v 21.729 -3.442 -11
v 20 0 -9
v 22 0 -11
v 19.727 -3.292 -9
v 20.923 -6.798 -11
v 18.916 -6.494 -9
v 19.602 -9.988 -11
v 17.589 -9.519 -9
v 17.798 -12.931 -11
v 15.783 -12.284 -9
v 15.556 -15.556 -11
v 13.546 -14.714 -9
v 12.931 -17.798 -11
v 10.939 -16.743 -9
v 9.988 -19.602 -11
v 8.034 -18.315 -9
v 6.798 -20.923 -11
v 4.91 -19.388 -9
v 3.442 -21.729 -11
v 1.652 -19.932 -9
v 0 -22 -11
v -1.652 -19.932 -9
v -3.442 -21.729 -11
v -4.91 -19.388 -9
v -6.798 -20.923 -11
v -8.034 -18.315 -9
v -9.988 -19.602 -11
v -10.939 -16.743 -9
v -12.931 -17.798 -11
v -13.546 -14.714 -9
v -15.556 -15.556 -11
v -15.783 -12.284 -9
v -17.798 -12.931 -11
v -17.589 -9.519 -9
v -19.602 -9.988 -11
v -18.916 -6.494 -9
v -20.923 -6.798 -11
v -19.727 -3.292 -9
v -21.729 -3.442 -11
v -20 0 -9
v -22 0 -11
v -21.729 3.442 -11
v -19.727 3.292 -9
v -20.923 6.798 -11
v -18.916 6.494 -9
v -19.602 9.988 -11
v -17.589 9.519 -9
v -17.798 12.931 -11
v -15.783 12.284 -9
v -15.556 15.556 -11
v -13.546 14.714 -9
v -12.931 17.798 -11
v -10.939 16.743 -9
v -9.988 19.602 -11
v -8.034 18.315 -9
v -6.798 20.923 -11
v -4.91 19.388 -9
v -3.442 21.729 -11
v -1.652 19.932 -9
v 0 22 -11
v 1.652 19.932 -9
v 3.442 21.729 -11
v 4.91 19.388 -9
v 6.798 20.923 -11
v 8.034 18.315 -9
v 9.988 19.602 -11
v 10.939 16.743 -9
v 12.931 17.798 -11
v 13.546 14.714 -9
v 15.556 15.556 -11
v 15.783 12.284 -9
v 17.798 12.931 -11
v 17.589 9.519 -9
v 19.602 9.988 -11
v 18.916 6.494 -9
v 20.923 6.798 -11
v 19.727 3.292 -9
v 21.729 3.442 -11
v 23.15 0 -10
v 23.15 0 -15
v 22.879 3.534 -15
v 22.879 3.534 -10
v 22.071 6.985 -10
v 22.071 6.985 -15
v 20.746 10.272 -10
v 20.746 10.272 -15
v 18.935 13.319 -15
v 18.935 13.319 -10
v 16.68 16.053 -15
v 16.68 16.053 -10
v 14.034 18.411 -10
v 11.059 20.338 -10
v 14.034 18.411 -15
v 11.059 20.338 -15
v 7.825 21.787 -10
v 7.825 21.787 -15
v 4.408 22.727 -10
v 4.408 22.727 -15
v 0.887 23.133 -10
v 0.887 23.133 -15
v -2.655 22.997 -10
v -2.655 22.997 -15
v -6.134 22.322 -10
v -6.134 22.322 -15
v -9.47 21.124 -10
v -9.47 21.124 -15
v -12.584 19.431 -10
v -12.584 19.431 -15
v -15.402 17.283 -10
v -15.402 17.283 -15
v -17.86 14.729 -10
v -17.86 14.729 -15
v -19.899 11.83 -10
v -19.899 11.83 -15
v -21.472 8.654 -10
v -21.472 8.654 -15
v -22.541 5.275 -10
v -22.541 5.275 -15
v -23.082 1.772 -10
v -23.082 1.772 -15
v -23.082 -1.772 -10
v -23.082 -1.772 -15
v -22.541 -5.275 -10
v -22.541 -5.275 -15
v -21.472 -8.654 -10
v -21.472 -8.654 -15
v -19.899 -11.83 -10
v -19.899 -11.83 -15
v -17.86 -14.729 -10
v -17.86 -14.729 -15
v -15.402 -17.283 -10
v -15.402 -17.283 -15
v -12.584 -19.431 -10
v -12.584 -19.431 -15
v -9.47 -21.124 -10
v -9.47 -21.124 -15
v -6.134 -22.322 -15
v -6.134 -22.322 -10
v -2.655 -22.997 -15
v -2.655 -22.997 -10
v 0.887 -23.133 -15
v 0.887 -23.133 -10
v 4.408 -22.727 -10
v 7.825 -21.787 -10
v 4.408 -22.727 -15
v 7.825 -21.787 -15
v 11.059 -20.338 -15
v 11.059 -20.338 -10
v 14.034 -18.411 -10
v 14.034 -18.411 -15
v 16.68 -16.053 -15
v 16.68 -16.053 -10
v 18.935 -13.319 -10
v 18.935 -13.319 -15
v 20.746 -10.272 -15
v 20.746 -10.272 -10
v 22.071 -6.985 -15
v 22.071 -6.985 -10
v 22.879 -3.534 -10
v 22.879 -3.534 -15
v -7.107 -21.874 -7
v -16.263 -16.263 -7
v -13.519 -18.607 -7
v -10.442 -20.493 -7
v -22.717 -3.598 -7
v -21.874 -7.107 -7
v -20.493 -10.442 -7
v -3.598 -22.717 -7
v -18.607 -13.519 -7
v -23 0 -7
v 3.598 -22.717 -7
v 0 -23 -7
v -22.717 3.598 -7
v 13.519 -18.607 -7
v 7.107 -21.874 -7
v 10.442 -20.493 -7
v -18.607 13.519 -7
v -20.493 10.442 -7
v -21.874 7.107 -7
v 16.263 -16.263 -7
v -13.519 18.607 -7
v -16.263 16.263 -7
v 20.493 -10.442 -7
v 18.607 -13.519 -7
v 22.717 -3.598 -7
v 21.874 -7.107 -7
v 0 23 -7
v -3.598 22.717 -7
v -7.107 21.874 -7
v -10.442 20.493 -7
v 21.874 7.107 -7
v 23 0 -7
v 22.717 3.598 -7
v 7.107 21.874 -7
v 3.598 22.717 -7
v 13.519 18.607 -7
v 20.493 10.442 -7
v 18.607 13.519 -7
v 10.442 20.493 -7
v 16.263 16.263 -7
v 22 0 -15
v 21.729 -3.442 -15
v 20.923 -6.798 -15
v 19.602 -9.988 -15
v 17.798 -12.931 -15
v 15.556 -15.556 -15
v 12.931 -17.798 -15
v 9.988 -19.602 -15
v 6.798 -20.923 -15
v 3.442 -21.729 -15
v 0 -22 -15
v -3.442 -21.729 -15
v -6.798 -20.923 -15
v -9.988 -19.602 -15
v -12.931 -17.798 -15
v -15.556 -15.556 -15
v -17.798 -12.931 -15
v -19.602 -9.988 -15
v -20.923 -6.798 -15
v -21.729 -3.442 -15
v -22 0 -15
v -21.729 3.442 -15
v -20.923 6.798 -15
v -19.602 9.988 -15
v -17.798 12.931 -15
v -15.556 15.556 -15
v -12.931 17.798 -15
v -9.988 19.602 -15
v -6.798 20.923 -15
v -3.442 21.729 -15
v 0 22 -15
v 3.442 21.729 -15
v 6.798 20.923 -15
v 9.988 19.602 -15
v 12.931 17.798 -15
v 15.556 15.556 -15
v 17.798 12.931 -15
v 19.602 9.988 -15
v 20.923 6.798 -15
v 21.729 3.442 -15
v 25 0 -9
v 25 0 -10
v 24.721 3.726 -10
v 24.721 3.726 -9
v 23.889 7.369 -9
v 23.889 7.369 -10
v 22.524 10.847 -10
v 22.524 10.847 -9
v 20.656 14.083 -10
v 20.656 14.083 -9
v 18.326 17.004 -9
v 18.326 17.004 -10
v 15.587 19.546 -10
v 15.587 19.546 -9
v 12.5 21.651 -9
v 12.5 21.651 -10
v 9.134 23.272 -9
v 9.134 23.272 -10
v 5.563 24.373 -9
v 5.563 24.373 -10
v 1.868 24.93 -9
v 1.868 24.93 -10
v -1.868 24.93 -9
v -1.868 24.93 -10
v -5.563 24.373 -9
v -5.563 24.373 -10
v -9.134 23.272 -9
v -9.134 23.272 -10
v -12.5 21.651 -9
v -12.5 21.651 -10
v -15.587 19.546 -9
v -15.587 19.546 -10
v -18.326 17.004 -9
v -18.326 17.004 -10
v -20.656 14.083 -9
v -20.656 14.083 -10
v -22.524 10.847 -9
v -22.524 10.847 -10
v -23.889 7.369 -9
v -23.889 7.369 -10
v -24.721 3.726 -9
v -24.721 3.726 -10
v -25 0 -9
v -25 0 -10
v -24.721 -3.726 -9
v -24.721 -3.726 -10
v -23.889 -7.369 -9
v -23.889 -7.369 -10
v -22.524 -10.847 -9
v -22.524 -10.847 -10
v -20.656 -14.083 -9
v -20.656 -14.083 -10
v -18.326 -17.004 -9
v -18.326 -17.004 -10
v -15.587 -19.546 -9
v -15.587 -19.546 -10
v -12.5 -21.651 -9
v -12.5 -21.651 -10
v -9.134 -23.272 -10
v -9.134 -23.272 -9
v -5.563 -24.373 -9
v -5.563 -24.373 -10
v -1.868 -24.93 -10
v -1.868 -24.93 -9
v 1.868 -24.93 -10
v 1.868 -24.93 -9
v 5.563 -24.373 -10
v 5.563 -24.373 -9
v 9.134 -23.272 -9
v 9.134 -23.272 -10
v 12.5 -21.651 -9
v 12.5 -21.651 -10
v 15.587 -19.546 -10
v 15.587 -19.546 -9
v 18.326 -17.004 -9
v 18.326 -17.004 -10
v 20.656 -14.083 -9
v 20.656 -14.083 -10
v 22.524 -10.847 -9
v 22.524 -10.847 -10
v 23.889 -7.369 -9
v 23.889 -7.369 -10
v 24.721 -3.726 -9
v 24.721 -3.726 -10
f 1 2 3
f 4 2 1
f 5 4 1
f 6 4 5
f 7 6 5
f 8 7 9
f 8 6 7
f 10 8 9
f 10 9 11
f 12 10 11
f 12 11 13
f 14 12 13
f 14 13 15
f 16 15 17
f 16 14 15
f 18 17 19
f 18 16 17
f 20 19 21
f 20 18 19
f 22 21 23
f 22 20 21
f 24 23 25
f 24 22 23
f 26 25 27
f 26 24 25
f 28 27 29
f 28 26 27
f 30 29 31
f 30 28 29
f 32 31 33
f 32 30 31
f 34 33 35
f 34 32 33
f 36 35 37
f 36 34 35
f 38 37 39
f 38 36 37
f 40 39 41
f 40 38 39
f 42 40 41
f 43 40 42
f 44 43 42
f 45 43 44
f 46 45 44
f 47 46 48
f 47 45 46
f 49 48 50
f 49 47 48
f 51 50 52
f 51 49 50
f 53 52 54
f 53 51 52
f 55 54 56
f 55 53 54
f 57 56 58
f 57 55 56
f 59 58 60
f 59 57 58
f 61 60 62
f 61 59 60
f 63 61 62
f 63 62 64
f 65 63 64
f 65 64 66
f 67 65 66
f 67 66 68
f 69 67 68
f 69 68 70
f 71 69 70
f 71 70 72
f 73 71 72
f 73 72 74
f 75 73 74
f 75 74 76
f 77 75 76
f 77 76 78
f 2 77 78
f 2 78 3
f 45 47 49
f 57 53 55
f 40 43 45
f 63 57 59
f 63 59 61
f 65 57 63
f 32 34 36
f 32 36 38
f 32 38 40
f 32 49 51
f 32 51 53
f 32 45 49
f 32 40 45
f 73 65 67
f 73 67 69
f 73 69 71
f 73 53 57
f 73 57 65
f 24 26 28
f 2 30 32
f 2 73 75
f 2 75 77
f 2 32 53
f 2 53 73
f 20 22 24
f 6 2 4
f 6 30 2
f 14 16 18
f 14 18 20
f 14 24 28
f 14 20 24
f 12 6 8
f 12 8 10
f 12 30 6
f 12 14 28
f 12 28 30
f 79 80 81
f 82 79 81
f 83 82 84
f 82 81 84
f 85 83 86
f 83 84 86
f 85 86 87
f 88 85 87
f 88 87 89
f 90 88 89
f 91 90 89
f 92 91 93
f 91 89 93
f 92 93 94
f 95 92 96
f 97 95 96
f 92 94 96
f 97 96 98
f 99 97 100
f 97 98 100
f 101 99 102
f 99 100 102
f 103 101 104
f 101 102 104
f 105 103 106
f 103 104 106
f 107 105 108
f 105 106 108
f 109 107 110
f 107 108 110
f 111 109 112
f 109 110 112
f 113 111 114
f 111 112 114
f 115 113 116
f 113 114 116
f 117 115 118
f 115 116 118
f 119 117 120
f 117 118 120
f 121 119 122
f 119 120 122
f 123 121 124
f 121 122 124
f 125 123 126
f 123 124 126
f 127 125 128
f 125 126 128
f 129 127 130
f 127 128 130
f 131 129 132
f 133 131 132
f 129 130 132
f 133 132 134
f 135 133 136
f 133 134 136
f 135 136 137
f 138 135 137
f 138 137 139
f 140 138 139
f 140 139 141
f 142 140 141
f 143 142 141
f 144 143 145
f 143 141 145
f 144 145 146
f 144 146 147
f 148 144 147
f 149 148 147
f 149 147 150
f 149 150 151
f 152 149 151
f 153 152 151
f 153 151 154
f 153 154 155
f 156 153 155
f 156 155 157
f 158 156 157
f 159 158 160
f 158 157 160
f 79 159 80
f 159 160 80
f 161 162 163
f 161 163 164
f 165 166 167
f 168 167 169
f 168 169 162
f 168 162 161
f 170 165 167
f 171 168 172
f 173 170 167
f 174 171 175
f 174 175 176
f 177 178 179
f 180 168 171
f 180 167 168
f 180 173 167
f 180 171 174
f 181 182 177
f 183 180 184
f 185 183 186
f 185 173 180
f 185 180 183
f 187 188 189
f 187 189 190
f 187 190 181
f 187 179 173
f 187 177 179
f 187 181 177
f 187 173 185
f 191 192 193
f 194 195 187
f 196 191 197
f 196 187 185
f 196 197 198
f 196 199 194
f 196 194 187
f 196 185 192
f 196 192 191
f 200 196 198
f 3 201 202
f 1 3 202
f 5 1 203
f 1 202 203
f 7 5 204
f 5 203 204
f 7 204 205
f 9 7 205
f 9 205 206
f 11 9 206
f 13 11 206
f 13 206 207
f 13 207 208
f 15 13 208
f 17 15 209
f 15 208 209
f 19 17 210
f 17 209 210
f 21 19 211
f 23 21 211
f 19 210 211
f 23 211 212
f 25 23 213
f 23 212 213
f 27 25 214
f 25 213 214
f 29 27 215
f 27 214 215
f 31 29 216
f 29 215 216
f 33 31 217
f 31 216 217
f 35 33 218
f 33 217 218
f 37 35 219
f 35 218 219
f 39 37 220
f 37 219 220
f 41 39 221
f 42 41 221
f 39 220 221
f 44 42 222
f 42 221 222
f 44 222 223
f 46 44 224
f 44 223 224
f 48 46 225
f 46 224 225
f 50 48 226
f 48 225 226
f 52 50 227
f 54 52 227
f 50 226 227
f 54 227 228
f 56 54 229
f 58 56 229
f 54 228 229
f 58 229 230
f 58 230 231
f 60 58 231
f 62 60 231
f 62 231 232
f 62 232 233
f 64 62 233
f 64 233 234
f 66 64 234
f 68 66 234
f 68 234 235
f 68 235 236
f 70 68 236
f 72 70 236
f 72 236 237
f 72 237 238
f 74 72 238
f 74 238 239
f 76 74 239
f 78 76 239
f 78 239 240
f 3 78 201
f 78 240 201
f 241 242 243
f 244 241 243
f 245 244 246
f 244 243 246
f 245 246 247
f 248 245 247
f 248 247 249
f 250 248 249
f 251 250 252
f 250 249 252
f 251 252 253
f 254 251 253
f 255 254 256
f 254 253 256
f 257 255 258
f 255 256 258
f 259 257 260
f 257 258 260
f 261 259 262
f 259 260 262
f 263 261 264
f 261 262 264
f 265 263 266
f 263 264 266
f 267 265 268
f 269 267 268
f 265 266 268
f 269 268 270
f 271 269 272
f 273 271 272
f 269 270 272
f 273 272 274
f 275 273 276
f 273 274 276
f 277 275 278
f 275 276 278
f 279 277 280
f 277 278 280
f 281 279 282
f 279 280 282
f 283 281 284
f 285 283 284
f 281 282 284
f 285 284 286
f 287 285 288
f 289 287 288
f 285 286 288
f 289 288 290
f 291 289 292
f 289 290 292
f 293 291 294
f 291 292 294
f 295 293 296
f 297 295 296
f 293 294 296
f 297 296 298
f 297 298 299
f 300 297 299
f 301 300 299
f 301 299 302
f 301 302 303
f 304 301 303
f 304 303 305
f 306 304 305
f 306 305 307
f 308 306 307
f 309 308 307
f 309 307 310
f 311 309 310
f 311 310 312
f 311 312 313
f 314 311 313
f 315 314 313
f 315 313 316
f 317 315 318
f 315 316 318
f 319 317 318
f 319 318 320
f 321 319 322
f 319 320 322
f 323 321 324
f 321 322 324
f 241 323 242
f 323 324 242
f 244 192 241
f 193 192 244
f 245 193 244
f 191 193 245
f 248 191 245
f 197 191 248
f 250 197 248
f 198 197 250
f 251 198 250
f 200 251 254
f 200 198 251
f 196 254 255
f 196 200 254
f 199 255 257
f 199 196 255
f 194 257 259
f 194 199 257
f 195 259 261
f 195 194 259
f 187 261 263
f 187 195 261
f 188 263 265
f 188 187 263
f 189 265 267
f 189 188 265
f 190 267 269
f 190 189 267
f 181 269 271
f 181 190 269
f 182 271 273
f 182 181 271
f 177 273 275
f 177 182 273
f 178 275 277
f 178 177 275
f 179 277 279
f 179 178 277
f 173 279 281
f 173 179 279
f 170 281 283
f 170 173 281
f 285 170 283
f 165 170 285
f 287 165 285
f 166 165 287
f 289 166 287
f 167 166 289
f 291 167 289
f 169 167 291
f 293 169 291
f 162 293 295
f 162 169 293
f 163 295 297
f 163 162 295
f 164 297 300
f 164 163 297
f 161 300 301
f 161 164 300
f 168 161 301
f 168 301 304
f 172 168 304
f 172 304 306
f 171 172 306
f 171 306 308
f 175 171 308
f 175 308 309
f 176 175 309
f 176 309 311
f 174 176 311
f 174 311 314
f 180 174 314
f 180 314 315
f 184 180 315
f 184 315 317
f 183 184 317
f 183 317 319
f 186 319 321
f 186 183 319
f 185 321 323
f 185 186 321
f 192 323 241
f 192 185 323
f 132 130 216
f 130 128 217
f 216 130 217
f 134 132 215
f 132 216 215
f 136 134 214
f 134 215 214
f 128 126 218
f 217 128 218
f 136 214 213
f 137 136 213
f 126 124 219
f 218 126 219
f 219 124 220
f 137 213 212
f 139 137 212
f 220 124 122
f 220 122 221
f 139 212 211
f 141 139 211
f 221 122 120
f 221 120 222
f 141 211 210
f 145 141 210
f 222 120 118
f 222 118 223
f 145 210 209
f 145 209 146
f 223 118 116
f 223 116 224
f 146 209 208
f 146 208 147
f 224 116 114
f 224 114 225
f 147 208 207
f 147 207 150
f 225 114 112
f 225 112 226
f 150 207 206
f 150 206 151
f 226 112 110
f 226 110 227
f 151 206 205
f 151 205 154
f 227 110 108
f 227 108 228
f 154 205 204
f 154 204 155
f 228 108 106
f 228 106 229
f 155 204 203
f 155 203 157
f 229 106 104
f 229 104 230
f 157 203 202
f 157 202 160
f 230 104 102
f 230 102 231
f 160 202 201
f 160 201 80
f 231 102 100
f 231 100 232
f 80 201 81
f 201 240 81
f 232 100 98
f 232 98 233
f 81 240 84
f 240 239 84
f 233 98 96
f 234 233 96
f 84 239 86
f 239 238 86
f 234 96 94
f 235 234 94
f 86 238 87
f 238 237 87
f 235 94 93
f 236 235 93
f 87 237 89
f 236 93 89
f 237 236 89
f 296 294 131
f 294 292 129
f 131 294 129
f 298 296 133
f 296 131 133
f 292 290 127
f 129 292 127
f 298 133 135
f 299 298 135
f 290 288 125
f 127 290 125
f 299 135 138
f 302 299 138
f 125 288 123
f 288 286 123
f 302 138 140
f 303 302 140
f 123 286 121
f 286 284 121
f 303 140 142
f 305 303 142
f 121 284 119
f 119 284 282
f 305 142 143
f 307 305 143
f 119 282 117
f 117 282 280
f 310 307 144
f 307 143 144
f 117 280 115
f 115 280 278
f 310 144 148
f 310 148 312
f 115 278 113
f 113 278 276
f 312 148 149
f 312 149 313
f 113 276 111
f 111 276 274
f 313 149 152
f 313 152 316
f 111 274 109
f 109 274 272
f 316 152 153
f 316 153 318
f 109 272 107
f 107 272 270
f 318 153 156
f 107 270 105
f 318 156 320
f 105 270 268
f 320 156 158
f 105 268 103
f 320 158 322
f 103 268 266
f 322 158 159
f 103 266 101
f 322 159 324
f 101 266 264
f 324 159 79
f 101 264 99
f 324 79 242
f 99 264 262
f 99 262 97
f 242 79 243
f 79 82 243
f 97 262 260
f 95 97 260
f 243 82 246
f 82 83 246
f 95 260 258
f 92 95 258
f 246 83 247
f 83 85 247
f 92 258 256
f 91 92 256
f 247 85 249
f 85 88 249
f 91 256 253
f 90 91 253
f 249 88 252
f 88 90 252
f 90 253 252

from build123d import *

# Parameters (mm, degrees)
SKETCH_R        = 23.15
PAD_DEPTH       = 5
SKETCH001_R     = 25
PAD001_DEPTH    = 3
CHAMFER_SIZE    = 2
SKETCH002_R     = 22
POCKET_DEPTH    = 6
CHAMFER001_SIZE = 2


with BuildPart() as part:
    # Sketch → Pad (new body)
    with BuildSketch(Plane.XY):
        Circle(SKETCH_R)
    extrude(amount=PAD_DEPTH)

    # Sketch001 (on Face3 of Pad) → Pad001 (join)
    with BuildSketch(Plane.XY.offset(5)):
        Circle(SKETCH001_R)
    extrude(amount=PAD001_DEPTH)

    # Chamfer
    chamfer_edges = [part.edges().sort_by_distance(p)[0] for p in [
        (-25, 0, 8),
    ]]
    chamfer(chamfer_edges, length=CHAMFER_SIZE)

    # Sketch002 (on Face6 of Chamfer) → Pocket (cut)
    with BuildSketch(Plane(origin=(0, 0, 0), x_dir=(1, 0, 0), z_dir=(0, 0, -1))):
        Circle(SKETCH002_R)
    extrude(amount=-POCKET_DEPTH, mode=Mode.SUBTRACT)

    # Chamfer001
    chamfer001_edges = [part.edges().sort_by_distance(p)[0] for p in [
        (-22, 0, 6),
    ]]
    chamfer(chamfer001_edges, length=CHAMFER001_SIZE)


with BuildPart() as part_1:
    # Body placement: moved
    add(part.part.moved(Location((0, 0, -15))))


solid = part_1.part
